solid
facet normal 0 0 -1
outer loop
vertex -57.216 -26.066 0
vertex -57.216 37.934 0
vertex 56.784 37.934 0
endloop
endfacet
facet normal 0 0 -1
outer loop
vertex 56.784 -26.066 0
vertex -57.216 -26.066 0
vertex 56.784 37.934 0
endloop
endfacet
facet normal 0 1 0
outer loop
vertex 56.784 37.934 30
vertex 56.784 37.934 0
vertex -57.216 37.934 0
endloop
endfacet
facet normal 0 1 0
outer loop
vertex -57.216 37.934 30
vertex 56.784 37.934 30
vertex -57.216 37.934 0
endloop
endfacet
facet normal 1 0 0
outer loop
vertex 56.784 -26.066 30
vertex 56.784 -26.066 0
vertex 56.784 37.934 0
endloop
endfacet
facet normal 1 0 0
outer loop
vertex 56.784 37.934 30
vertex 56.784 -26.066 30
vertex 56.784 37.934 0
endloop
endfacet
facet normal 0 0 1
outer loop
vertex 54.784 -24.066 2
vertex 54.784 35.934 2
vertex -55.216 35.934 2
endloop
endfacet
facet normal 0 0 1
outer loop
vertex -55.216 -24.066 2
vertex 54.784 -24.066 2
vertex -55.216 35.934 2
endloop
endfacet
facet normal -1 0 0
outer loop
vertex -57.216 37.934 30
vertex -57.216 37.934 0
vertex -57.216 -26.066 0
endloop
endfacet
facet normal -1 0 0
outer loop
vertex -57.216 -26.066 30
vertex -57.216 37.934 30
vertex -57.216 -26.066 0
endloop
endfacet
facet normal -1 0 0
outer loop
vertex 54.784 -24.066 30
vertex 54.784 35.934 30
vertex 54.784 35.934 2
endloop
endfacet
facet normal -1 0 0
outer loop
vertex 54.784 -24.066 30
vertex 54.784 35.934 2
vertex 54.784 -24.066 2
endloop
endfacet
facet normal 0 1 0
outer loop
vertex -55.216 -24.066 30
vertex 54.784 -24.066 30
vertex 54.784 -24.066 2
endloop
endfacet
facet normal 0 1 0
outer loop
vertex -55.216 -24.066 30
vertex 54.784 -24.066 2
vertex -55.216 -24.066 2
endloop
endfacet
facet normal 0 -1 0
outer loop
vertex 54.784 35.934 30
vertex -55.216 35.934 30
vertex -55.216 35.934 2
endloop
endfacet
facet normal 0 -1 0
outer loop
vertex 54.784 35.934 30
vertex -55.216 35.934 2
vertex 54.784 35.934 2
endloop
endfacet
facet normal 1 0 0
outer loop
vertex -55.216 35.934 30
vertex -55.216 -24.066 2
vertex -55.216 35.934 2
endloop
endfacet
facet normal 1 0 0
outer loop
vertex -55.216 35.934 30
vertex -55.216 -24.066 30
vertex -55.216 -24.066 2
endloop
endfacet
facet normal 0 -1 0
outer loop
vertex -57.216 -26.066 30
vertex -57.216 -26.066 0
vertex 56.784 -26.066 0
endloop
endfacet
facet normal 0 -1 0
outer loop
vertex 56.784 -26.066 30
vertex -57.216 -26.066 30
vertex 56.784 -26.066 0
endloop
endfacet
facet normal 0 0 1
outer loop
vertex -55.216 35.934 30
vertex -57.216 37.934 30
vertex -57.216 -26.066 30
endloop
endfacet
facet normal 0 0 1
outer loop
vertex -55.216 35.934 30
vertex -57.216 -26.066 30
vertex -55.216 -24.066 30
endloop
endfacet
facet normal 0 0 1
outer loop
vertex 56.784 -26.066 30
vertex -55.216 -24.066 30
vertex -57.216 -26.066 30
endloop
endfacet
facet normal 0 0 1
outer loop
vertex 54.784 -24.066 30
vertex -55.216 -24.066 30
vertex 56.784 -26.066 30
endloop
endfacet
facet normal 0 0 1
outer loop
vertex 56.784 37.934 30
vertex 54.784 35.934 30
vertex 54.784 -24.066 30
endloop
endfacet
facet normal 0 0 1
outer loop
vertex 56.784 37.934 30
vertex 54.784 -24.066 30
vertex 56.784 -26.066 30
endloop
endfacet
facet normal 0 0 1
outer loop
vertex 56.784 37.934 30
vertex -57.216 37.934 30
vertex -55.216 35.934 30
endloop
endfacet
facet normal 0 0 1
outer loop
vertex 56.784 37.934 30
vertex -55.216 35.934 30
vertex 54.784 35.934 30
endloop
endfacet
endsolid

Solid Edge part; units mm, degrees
sketch "Sketch1" plane through (0, 0, 0) normal (0, 0, 1) x (1, 0, 0)
  line L0 (-55.2164, -24.0658) -> (54.7836, -24.0658)
  line L1 (54.7836, -24.0658) -> (54.7836, 35.9342)
  line L2 (54.7836, 35.9342) -> (-55.2164, 35.9342)
  line L3 (-55.2164, 35.9342) -> (-55.2164, -24.0658)
extrude "Protrusion1" add sketch "Sketch1" along normal blind 30
sketch "Sketch2" plane through (0, 0, 0) normal (0, 0, 1) x (1, 0, 0)
  line L0 (56.7836, -26.0658) -> (56.7836, 37.9342)
  line L1 (56.7836, 37.9342) -> (-57.2164, 37.9342)
  line L2 (-57.2164, 37.9342) -> (-57.2164, -26.0658)
  line L3 (-57.2164, -26.0658) -> (54.7836, -26.0658)
  line L4 (54.7836, -26.0658) -> (56.7836, -26.0658)
extrude "ExtrudedProtrusion_2" add sketch "Sketch2" along normal blind 30
sketch "Sketch3" plane through (-0.2164, 5.9342, 30) normal (0, 0, 1) x (1, 0, 0)
  line L0 (-55, 30) -> (55, 30)
  line L1 (55, 30) -> (55, -30)
  line L2 (55, -30) -> (-55, -30)
  line L3 (-55, -30) -> (-55, 30)
extrude "ExtrudedCutout_1" cut sketch "Sketch3" against normal blind 28
